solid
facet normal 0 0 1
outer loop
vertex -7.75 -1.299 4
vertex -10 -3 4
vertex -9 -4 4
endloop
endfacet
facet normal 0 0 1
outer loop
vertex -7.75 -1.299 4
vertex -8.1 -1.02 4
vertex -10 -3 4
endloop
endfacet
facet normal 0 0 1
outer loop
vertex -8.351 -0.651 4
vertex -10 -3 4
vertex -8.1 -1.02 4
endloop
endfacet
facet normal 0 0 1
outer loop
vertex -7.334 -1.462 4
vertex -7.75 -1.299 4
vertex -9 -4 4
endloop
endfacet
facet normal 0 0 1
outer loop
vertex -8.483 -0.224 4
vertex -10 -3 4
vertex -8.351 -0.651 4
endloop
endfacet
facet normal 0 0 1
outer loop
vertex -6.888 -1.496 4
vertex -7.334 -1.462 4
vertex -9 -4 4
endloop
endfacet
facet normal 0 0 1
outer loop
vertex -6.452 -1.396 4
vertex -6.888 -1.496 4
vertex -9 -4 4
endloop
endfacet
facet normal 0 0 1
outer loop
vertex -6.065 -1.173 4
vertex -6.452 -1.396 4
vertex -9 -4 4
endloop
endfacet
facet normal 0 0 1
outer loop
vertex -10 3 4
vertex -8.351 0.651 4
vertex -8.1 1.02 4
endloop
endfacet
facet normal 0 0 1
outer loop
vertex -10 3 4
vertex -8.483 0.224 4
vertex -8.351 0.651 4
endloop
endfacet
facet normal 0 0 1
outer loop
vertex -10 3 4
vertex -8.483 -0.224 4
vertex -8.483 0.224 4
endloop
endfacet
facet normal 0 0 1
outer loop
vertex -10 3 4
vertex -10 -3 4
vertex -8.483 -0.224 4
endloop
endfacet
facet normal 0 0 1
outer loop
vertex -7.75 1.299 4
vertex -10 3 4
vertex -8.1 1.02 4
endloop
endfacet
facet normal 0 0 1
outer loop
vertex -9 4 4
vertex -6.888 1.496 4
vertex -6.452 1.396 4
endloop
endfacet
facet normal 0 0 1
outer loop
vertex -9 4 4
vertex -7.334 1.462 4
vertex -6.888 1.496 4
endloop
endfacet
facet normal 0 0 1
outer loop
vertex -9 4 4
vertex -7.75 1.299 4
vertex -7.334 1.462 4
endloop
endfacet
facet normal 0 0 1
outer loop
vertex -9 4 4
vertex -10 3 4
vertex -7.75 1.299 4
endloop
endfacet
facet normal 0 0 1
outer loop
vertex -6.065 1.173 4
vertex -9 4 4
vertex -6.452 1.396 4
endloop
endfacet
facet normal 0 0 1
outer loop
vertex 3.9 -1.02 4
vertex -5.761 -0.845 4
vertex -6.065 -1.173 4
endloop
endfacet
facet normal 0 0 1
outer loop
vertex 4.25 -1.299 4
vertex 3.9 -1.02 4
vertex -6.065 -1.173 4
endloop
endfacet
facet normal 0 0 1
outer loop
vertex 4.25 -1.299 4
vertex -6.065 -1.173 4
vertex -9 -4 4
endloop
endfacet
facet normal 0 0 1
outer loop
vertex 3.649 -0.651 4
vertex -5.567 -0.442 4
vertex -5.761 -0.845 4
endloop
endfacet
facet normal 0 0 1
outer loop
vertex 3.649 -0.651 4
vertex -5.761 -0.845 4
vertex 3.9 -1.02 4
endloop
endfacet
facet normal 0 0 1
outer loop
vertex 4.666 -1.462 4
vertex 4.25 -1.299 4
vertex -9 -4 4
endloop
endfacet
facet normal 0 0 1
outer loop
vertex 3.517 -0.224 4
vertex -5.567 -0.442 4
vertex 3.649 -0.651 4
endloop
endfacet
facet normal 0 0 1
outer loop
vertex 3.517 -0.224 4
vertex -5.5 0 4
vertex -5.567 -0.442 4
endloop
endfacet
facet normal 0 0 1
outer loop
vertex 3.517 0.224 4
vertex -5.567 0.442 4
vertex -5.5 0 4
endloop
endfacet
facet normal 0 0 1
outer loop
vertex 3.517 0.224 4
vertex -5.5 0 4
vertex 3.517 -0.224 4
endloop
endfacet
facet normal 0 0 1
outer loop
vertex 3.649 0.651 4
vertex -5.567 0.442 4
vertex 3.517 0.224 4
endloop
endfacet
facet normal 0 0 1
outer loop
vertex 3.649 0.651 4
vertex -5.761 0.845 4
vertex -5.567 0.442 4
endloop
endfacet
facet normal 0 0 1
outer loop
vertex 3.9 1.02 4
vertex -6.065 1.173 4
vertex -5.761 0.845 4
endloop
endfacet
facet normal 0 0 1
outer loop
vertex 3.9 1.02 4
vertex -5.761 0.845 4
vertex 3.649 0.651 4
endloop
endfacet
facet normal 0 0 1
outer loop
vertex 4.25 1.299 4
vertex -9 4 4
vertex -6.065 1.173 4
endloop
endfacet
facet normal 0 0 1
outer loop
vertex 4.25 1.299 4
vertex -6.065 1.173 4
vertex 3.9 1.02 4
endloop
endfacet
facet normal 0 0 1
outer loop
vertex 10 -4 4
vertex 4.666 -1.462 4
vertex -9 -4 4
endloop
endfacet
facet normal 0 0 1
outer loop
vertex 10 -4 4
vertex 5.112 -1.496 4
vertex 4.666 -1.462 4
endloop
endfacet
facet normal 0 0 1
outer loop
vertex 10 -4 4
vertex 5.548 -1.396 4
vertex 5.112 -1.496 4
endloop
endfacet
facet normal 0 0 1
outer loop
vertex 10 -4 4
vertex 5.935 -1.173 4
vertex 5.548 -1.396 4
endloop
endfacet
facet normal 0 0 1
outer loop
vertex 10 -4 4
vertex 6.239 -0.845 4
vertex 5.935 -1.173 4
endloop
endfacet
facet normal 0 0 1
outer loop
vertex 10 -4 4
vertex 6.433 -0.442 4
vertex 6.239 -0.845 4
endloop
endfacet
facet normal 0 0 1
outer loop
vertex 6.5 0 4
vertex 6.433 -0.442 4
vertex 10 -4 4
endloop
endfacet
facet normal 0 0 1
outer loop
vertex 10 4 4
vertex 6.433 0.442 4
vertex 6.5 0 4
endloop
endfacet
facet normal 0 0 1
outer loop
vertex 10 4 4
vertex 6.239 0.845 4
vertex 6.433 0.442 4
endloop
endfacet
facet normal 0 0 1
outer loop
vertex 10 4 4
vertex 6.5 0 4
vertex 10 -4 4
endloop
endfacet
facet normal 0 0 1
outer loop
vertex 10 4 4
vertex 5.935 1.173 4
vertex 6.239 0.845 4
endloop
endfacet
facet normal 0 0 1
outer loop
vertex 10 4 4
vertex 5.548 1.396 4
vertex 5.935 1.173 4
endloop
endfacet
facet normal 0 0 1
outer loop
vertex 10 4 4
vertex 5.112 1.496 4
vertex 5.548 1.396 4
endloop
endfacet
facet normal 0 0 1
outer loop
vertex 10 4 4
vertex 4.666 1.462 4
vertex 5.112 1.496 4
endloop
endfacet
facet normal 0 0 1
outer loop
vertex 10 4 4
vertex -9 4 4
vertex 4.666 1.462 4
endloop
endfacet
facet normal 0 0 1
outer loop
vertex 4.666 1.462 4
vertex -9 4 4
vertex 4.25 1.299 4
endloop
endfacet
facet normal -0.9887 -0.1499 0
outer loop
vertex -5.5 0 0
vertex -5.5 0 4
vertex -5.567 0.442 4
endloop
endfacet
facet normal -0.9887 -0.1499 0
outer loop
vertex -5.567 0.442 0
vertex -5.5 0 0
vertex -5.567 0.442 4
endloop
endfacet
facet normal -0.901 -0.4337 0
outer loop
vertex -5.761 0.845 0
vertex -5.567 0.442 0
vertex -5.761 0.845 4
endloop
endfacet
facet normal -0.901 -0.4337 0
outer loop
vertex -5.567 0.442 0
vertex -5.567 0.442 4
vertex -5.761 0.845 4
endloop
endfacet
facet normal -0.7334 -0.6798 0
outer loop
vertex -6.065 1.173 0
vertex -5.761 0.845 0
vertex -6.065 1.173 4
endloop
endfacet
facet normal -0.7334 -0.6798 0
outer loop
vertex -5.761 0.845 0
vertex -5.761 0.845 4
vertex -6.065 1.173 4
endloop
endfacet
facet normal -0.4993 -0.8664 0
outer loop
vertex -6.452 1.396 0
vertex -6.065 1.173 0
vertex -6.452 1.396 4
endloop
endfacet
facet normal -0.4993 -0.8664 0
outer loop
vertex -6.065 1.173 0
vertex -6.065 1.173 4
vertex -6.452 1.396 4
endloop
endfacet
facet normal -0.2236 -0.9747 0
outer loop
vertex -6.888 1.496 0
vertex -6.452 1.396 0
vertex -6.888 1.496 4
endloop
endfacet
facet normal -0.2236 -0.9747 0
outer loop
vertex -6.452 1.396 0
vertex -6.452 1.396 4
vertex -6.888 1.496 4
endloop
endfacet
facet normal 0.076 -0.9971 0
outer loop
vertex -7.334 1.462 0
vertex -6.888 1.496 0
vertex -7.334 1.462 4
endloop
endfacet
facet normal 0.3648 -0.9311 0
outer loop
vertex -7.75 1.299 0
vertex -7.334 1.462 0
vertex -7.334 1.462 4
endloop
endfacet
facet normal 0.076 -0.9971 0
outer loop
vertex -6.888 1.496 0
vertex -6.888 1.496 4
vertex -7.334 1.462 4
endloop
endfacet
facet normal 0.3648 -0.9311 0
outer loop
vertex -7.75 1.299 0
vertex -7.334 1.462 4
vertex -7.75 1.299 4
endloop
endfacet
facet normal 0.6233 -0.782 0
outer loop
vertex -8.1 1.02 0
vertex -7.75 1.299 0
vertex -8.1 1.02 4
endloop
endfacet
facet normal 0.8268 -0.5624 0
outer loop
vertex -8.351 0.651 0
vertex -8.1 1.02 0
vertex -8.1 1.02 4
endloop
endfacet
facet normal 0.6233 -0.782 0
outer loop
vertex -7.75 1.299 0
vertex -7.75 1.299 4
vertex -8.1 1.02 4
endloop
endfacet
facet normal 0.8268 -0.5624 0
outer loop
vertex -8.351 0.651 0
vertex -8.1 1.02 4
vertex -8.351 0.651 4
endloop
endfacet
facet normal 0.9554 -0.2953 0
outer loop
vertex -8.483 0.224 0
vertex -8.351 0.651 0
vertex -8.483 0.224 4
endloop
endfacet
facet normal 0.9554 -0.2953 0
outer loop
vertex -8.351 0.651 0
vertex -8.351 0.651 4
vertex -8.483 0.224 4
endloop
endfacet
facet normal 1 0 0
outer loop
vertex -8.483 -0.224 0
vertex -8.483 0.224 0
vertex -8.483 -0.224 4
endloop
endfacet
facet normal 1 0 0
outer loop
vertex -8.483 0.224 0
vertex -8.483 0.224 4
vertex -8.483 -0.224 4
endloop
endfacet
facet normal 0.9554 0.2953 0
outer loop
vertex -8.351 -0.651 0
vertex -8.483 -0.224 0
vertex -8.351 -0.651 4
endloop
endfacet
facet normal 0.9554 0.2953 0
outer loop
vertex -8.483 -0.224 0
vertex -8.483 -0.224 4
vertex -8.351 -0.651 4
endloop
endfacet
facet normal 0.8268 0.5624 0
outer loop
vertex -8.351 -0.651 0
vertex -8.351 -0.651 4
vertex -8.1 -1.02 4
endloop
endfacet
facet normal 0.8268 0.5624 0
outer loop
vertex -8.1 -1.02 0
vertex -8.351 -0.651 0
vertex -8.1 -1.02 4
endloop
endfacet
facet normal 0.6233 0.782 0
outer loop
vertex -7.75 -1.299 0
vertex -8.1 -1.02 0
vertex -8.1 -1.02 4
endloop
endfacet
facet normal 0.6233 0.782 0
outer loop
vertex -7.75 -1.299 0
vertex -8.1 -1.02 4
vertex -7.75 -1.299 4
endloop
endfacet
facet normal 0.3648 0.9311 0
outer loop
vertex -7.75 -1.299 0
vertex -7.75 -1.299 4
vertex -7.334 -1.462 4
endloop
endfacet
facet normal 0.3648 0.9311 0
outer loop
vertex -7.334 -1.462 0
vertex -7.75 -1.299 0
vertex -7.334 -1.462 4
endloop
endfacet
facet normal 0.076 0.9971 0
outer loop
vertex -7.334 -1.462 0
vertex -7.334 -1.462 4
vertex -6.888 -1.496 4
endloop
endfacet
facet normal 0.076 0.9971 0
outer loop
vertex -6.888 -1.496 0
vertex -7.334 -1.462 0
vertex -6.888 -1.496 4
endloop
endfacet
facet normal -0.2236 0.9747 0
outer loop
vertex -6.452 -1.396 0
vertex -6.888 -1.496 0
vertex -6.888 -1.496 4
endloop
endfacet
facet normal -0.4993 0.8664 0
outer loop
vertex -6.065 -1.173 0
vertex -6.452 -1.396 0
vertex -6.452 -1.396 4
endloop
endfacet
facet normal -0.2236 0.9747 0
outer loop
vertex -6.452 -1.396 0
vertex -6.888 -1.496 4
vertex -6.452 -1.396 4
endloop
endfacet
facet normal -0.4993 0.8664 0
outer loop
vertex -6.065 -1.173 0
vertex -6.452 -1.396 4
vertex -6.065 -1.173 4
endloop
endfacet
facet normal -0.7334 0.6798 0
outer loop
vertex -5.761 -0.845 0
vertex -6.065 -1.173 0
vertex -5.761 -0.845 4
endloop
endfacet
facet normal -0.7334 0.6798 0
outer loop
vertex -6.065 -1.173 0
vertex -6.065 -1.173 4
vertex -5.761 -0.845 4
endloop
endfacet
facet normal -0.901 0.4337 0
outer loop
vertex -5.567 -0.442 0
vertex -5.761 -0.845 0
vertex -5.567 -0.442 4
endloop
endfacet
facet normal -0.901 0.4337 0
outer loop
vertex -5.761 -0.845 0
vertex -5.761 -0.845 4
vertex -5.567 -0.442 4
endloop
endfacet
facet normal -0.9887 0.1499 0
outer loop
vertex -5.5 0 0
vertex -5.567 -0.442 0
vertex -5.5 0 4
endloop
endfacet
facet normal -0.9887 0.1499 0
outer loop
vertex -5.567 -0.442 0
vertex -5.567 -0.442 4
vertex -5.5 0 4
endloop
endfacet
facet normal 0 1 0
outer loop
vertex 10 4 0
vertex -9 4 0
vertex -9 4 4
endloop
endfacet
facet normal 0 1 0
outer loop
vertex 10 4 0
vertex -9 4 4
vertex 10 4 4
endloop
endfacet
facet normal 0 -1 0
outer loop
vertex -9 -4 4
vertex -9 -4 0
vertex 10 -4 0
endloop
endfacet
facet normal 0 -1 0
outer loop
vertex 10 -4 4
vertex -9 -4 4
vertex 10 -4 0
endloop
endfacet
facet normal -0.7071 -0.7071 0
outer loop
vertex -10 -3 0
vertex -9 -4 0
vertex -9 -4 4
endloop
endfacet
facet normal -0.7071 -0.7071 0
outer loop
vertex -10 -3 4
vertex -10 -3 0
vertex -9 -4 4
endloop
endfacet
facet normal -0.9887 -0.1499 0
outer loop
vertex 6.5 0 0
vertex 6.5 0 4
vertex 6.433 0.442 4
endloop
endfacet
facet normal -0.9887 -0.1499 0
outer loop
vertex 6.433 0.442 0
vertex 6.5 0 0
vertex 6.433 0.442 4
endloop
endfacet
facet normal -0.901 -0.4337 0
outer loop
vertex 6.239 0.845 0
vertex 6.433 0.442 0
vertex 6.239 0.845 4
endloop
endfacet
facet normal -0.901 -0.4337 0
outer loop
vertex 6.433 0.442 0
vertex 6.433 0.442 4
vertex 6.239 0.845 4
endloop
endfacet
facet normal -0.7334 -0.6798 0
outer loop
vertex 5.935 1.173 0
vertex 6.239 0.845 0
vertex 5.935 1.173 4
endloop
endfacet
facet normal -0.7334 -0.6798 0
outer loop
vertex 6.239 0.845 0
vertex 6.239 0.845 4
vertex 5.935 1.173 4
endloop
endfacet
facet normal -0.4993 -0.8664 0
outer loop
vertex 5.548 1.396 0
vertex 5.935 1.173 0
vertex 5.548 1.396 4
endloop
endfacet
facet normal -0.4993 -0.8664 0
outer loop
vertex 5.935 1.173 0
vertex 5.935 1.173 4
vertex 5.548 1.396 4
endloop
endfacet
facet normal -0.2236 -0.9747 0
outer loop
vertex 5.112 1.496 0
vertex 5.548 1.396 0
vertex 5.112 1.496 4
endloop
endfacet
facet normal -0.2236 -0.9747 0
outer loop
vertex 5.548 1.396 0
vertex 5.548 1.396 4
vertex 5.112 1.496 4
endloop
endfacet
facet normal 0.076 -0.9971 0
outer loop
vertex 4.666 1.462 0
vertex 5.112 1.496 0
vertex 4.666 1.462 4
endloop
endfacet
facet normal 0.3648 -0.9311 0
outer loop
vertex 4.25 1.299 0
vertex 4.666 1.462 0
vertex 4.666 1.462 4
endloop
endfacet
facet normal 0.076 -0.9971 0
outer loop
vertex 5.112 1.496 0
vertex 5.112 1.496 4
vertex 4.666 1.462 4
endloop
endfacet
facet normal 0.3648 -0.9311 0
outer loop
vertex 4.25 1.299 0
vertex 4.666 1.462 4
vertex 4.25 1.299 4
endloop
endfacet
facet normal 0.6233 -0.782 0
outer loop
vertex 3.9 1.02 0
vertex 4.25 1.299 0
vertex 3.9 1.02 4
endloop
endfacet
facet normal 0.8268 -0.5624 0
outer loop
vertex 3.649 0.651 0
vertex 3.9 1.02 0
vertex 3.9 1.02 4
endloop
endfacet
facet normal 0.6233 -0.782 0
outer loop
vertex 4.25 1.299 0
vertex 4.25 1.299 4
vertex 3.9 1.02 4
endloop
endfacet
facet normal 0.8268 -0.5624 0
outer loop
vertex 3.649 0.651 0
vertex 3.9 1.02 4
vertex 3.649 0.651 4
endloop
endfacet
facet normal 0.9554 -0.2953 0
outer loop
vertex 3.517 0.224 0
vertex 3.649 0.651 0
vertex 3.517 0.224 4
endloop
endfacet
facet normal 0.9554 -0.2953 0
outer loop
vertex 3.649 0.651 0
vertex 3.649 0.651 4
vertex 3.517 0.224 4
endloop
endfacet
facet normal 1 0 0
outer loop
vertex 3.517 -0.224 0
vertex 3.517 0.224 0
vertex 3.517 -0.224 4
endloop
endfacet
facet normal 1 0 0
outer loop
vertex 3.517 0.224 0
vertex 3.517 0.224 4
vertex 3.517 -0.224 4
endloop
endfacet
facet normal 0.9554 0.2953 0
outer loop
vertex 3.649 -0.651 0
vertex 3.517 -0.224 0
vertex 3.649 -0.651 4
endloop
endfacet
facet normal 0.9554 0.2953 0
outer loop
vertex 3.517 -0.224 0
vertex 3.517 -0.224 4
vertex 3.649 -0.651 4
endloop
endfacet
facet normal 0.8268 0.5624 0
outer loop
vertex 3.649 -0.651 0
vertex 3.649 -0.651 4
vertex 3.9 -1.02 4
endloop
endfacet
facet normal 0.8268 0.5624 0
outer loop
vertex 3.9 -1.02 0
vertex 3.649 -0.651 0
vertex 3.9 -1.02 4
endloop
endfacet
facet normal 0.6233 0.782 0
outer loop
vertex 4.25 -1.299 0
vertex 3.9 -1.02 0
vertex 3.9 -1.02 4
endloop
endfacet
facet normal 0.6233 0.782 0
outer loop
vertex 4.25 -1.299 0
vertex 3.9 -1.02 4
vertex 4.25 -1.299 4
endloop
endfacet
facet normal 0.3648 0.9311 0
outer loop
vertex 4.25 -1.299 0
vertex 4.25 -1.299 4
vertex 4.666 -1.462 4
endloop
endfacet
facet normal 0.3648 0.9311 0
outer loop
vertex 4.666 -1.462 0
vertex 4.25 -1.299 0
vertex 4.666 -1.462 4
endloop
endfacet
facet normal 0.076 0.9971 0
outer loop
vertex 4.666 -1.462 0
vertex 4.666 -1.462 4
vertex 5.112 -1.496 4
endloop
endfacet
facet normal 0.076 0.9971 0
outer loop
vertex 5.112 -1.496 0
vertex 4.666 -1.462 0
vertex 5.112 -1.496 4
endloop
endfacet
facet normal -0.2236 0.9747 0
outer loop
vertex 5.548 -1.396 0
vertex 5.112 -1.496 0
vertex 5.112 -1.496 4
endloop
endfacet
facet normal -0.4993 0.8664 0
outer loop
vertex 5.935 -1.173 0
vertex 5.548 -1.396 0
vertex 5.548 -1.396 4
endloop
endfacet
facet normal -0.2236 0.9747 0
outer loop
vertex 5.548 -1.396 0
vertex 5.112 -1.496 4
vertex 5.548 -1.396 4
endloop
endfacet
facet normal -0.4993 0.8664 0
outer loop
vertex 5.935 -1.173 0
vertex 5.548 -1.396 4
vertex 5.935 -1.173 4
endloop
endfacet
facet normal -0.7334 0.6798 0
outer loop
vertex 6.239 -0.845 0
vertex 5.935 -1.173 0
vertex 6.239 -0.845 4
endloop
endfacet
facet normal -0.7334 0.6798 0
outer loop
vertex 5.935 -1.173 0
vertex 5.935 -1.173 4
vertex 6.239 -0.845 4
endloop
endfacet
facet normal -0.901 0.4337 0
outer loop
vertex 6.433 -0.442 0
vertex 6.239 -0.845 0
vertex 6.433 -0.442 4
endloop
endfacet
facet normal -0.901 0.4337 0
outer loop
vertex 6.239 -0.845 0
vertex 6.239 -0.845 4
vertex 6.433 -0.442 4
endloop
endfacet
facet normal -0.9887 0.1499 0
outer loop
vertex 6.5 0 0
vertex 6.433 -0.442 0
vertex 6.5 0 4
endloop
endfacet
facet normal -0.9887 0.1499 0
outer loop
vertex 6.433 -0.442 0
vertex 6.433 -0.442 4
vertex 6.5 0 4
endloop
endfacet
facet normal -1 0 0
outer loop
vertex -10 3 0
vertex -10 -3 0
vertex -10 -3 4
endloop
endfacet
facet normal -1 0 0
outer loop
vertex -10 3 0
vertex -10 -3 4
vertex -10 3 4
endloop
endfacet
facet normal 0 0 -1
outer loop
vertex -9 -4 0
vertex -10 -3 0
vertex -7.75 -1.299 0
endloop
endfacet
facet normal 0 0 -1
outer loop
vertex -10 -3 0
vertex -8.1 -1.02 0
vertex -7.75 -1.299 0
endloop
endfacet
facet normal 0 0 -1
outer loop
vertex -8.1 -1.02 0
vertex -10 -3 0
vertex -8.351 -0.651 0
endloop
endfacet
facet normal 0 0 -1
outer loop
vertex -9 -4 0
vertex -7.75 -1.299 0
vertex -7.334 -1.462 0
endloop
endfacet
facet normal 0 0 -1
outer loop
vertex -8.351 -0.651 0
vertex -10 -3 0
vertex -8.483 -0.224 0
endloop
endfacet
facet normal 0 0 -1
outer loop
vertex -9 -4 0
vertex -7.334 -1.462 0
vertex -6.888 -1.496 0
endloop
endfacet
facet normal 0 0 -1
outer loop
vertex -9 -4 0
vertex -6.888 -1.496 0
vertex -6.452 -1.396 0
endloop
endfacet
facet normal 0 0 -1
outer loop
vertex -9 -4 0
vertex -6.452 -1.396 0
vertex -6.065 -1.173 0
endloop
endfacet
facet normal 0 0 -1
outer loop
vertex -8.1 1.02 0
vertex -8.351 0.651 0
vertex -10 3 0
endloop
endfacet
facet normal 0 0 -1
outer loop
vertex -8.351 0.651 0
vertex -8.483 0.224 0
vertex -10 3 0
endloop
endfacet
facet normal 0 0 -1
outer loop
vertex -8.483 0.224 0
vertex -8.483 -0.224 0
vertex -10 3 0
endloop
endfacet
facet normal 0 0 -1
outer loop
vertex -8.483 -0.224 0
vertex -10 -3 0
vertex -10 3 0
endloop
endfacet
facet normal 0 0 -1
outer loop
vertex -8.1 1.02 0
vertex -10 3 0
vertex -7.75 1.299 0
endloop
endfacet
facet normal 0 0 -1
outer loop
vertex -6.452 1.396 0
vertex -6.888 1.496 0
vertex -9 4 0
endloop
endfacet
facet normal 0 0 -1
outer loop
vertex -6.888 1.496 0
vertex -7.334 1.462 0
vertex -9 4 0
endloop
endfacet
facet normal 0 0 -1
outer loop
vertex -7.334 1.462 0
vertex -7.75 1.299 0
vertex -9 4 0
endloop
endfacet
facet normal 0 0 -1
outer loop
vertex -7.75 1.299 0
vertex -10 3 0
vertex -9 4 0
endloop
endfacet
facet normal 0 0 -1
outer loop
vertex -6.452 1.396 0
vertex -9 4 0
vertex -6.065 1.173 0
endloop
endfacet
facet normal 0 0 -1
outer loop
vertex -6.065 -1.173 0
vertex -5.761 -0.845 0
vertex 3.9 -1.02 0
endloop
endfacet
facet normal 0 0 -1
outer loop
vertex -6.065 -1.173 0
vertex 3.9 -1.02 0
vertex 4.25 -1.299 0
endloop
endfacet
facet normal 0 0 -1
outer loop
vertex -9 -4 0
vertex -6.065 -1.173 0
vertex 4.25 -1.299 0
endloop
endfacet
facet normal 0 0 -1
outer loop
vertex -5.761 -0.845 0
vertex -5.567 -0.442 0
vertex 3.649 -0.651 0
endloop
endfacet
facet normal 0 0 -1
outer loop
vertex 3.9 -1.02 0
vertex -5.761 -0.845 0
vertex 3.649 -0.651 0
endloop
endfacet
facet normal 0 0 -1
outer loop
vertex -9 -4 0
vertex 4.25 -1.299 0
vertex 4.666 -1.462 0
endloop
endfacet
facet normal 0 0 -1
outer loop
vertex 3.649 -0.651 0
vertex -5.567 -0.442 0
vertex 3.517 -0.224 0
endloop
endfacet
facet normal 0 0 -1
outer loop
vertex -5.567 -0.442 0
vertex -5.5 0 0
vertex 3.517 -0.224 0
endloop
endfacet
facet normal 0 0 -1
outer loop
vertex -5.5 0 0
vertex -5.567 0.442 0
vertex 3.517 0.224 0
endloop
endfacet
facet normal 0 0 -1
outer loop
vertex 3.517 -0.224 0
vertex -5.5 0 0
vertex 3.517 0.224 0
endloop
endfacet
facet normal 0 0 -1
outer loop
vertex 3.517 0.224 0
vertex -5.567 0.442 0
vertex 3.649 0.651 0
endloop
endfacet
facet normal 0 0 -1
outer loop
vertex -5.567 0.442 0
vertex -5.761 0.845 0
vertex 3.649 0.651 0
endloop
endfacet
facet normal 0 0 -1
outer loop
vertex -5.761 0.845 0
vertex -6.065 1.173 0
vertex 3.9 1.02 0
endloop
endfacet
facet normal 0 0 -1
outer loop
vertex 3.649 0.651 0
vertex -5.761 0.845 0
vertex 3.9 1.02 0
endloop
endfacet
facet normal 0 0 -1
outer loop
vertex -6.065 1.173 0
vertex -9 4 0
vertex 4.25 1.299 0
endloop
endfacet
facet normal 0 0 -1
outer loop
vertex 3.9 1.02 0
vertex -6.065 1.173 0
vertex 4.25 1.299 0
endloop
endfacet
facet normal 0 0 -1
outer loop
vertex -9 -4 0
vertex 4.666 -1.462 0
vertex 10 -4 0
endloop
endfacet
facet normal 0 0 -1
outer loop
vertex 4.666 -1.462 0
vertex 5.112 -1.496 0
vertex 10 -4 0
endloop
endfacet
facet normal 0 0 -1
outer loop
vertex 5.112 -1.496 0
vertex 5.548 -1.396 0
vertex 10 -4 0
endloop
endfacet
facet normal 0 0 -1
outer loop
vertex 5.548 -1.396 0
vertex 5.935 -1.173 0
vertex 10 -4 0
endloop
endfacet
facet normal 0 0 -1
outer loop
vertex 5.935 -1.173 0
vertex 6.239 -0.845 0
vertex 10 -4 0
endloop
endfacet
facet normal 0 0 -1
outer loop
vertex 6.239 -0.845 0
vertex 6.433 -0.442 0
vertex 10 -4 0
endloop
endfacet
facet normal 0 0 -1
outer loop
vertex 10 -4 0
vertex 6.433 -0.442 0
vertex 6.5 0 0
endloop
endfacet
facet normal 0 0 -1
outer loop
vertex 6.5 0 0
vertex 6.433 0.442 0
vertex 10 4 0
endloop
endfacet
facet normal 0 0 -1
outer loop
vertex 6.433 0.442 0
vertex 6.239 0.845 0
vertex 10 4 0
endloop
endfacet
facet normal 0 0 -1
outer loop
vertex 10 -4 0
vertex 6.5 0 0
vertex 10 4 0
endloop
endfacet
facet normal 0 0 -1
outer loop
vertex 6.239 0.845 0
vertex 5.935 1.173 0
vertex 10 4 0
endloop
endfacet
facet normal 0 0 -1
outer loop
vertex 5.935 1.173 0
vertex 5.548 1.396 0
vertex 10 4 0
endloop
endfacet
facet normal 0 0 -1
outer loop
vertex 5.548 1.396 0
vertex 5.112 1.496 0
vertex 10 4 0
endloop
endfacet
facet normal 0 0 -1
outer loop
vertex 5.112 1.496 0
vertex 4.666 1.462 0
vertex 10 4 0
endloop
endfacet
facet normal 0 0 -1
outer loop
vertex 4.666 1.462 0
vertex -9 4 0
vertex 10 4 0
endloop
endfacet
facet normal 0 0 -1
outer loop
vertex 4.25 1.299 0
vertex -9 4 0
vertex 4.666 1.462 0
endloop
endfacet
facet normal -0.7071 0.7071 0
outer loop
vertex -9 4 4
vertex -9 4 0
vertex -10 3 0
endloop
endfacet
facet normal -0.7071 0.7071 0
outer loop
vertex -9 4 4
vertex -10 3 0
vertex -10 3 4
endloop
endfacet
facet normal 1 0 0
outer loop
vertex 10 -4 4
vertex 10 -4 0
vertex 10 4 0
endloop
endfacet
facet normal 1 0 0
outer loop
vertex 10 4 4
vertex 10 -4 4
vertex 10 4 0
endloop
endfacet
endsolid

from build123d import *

# Parameters (mm, degrees)
SKETCH1_W      = 20
SKETCH1_H      = 8
EXTRUDE1_DEPTH = 4
CHAMFER1_SIZE  = 1
SKETCH2_R      = 1.5
EXTRUDE2_DEPTH = 4


with BuildPart() as part:
    # Sketch1 → Extrude1 (new body)
    with BuildSketch(Plane.XY):
        Rectangle(SKETCH1_W, SKETCH1_H)
    extrude(amount=EXTRUDE1_DEPTH)

    # Chamfer1
    chamfer1_edges = [part.edges().sort_by_distance(p)[0] for p in [
        (-10, -4, 2),
        (-10, 4, 2),
    ]]
    chamfer(chamfer1_edges, length=CHAMFER1_SIZE)

    # Sketch2 → Extrude2 (cut)
    with BuildSketch(Plane.XY.offset(4)):
        with Locations((-7, 0)):
            Circle(SKETCH2_R)
        with Locations((5, 0)):
            Circle(SKETCH2_R)
    extrude(amount=-EXTRUDE2_DEPTH, mode=Mode.SUBTRACT)


solid = part.part
